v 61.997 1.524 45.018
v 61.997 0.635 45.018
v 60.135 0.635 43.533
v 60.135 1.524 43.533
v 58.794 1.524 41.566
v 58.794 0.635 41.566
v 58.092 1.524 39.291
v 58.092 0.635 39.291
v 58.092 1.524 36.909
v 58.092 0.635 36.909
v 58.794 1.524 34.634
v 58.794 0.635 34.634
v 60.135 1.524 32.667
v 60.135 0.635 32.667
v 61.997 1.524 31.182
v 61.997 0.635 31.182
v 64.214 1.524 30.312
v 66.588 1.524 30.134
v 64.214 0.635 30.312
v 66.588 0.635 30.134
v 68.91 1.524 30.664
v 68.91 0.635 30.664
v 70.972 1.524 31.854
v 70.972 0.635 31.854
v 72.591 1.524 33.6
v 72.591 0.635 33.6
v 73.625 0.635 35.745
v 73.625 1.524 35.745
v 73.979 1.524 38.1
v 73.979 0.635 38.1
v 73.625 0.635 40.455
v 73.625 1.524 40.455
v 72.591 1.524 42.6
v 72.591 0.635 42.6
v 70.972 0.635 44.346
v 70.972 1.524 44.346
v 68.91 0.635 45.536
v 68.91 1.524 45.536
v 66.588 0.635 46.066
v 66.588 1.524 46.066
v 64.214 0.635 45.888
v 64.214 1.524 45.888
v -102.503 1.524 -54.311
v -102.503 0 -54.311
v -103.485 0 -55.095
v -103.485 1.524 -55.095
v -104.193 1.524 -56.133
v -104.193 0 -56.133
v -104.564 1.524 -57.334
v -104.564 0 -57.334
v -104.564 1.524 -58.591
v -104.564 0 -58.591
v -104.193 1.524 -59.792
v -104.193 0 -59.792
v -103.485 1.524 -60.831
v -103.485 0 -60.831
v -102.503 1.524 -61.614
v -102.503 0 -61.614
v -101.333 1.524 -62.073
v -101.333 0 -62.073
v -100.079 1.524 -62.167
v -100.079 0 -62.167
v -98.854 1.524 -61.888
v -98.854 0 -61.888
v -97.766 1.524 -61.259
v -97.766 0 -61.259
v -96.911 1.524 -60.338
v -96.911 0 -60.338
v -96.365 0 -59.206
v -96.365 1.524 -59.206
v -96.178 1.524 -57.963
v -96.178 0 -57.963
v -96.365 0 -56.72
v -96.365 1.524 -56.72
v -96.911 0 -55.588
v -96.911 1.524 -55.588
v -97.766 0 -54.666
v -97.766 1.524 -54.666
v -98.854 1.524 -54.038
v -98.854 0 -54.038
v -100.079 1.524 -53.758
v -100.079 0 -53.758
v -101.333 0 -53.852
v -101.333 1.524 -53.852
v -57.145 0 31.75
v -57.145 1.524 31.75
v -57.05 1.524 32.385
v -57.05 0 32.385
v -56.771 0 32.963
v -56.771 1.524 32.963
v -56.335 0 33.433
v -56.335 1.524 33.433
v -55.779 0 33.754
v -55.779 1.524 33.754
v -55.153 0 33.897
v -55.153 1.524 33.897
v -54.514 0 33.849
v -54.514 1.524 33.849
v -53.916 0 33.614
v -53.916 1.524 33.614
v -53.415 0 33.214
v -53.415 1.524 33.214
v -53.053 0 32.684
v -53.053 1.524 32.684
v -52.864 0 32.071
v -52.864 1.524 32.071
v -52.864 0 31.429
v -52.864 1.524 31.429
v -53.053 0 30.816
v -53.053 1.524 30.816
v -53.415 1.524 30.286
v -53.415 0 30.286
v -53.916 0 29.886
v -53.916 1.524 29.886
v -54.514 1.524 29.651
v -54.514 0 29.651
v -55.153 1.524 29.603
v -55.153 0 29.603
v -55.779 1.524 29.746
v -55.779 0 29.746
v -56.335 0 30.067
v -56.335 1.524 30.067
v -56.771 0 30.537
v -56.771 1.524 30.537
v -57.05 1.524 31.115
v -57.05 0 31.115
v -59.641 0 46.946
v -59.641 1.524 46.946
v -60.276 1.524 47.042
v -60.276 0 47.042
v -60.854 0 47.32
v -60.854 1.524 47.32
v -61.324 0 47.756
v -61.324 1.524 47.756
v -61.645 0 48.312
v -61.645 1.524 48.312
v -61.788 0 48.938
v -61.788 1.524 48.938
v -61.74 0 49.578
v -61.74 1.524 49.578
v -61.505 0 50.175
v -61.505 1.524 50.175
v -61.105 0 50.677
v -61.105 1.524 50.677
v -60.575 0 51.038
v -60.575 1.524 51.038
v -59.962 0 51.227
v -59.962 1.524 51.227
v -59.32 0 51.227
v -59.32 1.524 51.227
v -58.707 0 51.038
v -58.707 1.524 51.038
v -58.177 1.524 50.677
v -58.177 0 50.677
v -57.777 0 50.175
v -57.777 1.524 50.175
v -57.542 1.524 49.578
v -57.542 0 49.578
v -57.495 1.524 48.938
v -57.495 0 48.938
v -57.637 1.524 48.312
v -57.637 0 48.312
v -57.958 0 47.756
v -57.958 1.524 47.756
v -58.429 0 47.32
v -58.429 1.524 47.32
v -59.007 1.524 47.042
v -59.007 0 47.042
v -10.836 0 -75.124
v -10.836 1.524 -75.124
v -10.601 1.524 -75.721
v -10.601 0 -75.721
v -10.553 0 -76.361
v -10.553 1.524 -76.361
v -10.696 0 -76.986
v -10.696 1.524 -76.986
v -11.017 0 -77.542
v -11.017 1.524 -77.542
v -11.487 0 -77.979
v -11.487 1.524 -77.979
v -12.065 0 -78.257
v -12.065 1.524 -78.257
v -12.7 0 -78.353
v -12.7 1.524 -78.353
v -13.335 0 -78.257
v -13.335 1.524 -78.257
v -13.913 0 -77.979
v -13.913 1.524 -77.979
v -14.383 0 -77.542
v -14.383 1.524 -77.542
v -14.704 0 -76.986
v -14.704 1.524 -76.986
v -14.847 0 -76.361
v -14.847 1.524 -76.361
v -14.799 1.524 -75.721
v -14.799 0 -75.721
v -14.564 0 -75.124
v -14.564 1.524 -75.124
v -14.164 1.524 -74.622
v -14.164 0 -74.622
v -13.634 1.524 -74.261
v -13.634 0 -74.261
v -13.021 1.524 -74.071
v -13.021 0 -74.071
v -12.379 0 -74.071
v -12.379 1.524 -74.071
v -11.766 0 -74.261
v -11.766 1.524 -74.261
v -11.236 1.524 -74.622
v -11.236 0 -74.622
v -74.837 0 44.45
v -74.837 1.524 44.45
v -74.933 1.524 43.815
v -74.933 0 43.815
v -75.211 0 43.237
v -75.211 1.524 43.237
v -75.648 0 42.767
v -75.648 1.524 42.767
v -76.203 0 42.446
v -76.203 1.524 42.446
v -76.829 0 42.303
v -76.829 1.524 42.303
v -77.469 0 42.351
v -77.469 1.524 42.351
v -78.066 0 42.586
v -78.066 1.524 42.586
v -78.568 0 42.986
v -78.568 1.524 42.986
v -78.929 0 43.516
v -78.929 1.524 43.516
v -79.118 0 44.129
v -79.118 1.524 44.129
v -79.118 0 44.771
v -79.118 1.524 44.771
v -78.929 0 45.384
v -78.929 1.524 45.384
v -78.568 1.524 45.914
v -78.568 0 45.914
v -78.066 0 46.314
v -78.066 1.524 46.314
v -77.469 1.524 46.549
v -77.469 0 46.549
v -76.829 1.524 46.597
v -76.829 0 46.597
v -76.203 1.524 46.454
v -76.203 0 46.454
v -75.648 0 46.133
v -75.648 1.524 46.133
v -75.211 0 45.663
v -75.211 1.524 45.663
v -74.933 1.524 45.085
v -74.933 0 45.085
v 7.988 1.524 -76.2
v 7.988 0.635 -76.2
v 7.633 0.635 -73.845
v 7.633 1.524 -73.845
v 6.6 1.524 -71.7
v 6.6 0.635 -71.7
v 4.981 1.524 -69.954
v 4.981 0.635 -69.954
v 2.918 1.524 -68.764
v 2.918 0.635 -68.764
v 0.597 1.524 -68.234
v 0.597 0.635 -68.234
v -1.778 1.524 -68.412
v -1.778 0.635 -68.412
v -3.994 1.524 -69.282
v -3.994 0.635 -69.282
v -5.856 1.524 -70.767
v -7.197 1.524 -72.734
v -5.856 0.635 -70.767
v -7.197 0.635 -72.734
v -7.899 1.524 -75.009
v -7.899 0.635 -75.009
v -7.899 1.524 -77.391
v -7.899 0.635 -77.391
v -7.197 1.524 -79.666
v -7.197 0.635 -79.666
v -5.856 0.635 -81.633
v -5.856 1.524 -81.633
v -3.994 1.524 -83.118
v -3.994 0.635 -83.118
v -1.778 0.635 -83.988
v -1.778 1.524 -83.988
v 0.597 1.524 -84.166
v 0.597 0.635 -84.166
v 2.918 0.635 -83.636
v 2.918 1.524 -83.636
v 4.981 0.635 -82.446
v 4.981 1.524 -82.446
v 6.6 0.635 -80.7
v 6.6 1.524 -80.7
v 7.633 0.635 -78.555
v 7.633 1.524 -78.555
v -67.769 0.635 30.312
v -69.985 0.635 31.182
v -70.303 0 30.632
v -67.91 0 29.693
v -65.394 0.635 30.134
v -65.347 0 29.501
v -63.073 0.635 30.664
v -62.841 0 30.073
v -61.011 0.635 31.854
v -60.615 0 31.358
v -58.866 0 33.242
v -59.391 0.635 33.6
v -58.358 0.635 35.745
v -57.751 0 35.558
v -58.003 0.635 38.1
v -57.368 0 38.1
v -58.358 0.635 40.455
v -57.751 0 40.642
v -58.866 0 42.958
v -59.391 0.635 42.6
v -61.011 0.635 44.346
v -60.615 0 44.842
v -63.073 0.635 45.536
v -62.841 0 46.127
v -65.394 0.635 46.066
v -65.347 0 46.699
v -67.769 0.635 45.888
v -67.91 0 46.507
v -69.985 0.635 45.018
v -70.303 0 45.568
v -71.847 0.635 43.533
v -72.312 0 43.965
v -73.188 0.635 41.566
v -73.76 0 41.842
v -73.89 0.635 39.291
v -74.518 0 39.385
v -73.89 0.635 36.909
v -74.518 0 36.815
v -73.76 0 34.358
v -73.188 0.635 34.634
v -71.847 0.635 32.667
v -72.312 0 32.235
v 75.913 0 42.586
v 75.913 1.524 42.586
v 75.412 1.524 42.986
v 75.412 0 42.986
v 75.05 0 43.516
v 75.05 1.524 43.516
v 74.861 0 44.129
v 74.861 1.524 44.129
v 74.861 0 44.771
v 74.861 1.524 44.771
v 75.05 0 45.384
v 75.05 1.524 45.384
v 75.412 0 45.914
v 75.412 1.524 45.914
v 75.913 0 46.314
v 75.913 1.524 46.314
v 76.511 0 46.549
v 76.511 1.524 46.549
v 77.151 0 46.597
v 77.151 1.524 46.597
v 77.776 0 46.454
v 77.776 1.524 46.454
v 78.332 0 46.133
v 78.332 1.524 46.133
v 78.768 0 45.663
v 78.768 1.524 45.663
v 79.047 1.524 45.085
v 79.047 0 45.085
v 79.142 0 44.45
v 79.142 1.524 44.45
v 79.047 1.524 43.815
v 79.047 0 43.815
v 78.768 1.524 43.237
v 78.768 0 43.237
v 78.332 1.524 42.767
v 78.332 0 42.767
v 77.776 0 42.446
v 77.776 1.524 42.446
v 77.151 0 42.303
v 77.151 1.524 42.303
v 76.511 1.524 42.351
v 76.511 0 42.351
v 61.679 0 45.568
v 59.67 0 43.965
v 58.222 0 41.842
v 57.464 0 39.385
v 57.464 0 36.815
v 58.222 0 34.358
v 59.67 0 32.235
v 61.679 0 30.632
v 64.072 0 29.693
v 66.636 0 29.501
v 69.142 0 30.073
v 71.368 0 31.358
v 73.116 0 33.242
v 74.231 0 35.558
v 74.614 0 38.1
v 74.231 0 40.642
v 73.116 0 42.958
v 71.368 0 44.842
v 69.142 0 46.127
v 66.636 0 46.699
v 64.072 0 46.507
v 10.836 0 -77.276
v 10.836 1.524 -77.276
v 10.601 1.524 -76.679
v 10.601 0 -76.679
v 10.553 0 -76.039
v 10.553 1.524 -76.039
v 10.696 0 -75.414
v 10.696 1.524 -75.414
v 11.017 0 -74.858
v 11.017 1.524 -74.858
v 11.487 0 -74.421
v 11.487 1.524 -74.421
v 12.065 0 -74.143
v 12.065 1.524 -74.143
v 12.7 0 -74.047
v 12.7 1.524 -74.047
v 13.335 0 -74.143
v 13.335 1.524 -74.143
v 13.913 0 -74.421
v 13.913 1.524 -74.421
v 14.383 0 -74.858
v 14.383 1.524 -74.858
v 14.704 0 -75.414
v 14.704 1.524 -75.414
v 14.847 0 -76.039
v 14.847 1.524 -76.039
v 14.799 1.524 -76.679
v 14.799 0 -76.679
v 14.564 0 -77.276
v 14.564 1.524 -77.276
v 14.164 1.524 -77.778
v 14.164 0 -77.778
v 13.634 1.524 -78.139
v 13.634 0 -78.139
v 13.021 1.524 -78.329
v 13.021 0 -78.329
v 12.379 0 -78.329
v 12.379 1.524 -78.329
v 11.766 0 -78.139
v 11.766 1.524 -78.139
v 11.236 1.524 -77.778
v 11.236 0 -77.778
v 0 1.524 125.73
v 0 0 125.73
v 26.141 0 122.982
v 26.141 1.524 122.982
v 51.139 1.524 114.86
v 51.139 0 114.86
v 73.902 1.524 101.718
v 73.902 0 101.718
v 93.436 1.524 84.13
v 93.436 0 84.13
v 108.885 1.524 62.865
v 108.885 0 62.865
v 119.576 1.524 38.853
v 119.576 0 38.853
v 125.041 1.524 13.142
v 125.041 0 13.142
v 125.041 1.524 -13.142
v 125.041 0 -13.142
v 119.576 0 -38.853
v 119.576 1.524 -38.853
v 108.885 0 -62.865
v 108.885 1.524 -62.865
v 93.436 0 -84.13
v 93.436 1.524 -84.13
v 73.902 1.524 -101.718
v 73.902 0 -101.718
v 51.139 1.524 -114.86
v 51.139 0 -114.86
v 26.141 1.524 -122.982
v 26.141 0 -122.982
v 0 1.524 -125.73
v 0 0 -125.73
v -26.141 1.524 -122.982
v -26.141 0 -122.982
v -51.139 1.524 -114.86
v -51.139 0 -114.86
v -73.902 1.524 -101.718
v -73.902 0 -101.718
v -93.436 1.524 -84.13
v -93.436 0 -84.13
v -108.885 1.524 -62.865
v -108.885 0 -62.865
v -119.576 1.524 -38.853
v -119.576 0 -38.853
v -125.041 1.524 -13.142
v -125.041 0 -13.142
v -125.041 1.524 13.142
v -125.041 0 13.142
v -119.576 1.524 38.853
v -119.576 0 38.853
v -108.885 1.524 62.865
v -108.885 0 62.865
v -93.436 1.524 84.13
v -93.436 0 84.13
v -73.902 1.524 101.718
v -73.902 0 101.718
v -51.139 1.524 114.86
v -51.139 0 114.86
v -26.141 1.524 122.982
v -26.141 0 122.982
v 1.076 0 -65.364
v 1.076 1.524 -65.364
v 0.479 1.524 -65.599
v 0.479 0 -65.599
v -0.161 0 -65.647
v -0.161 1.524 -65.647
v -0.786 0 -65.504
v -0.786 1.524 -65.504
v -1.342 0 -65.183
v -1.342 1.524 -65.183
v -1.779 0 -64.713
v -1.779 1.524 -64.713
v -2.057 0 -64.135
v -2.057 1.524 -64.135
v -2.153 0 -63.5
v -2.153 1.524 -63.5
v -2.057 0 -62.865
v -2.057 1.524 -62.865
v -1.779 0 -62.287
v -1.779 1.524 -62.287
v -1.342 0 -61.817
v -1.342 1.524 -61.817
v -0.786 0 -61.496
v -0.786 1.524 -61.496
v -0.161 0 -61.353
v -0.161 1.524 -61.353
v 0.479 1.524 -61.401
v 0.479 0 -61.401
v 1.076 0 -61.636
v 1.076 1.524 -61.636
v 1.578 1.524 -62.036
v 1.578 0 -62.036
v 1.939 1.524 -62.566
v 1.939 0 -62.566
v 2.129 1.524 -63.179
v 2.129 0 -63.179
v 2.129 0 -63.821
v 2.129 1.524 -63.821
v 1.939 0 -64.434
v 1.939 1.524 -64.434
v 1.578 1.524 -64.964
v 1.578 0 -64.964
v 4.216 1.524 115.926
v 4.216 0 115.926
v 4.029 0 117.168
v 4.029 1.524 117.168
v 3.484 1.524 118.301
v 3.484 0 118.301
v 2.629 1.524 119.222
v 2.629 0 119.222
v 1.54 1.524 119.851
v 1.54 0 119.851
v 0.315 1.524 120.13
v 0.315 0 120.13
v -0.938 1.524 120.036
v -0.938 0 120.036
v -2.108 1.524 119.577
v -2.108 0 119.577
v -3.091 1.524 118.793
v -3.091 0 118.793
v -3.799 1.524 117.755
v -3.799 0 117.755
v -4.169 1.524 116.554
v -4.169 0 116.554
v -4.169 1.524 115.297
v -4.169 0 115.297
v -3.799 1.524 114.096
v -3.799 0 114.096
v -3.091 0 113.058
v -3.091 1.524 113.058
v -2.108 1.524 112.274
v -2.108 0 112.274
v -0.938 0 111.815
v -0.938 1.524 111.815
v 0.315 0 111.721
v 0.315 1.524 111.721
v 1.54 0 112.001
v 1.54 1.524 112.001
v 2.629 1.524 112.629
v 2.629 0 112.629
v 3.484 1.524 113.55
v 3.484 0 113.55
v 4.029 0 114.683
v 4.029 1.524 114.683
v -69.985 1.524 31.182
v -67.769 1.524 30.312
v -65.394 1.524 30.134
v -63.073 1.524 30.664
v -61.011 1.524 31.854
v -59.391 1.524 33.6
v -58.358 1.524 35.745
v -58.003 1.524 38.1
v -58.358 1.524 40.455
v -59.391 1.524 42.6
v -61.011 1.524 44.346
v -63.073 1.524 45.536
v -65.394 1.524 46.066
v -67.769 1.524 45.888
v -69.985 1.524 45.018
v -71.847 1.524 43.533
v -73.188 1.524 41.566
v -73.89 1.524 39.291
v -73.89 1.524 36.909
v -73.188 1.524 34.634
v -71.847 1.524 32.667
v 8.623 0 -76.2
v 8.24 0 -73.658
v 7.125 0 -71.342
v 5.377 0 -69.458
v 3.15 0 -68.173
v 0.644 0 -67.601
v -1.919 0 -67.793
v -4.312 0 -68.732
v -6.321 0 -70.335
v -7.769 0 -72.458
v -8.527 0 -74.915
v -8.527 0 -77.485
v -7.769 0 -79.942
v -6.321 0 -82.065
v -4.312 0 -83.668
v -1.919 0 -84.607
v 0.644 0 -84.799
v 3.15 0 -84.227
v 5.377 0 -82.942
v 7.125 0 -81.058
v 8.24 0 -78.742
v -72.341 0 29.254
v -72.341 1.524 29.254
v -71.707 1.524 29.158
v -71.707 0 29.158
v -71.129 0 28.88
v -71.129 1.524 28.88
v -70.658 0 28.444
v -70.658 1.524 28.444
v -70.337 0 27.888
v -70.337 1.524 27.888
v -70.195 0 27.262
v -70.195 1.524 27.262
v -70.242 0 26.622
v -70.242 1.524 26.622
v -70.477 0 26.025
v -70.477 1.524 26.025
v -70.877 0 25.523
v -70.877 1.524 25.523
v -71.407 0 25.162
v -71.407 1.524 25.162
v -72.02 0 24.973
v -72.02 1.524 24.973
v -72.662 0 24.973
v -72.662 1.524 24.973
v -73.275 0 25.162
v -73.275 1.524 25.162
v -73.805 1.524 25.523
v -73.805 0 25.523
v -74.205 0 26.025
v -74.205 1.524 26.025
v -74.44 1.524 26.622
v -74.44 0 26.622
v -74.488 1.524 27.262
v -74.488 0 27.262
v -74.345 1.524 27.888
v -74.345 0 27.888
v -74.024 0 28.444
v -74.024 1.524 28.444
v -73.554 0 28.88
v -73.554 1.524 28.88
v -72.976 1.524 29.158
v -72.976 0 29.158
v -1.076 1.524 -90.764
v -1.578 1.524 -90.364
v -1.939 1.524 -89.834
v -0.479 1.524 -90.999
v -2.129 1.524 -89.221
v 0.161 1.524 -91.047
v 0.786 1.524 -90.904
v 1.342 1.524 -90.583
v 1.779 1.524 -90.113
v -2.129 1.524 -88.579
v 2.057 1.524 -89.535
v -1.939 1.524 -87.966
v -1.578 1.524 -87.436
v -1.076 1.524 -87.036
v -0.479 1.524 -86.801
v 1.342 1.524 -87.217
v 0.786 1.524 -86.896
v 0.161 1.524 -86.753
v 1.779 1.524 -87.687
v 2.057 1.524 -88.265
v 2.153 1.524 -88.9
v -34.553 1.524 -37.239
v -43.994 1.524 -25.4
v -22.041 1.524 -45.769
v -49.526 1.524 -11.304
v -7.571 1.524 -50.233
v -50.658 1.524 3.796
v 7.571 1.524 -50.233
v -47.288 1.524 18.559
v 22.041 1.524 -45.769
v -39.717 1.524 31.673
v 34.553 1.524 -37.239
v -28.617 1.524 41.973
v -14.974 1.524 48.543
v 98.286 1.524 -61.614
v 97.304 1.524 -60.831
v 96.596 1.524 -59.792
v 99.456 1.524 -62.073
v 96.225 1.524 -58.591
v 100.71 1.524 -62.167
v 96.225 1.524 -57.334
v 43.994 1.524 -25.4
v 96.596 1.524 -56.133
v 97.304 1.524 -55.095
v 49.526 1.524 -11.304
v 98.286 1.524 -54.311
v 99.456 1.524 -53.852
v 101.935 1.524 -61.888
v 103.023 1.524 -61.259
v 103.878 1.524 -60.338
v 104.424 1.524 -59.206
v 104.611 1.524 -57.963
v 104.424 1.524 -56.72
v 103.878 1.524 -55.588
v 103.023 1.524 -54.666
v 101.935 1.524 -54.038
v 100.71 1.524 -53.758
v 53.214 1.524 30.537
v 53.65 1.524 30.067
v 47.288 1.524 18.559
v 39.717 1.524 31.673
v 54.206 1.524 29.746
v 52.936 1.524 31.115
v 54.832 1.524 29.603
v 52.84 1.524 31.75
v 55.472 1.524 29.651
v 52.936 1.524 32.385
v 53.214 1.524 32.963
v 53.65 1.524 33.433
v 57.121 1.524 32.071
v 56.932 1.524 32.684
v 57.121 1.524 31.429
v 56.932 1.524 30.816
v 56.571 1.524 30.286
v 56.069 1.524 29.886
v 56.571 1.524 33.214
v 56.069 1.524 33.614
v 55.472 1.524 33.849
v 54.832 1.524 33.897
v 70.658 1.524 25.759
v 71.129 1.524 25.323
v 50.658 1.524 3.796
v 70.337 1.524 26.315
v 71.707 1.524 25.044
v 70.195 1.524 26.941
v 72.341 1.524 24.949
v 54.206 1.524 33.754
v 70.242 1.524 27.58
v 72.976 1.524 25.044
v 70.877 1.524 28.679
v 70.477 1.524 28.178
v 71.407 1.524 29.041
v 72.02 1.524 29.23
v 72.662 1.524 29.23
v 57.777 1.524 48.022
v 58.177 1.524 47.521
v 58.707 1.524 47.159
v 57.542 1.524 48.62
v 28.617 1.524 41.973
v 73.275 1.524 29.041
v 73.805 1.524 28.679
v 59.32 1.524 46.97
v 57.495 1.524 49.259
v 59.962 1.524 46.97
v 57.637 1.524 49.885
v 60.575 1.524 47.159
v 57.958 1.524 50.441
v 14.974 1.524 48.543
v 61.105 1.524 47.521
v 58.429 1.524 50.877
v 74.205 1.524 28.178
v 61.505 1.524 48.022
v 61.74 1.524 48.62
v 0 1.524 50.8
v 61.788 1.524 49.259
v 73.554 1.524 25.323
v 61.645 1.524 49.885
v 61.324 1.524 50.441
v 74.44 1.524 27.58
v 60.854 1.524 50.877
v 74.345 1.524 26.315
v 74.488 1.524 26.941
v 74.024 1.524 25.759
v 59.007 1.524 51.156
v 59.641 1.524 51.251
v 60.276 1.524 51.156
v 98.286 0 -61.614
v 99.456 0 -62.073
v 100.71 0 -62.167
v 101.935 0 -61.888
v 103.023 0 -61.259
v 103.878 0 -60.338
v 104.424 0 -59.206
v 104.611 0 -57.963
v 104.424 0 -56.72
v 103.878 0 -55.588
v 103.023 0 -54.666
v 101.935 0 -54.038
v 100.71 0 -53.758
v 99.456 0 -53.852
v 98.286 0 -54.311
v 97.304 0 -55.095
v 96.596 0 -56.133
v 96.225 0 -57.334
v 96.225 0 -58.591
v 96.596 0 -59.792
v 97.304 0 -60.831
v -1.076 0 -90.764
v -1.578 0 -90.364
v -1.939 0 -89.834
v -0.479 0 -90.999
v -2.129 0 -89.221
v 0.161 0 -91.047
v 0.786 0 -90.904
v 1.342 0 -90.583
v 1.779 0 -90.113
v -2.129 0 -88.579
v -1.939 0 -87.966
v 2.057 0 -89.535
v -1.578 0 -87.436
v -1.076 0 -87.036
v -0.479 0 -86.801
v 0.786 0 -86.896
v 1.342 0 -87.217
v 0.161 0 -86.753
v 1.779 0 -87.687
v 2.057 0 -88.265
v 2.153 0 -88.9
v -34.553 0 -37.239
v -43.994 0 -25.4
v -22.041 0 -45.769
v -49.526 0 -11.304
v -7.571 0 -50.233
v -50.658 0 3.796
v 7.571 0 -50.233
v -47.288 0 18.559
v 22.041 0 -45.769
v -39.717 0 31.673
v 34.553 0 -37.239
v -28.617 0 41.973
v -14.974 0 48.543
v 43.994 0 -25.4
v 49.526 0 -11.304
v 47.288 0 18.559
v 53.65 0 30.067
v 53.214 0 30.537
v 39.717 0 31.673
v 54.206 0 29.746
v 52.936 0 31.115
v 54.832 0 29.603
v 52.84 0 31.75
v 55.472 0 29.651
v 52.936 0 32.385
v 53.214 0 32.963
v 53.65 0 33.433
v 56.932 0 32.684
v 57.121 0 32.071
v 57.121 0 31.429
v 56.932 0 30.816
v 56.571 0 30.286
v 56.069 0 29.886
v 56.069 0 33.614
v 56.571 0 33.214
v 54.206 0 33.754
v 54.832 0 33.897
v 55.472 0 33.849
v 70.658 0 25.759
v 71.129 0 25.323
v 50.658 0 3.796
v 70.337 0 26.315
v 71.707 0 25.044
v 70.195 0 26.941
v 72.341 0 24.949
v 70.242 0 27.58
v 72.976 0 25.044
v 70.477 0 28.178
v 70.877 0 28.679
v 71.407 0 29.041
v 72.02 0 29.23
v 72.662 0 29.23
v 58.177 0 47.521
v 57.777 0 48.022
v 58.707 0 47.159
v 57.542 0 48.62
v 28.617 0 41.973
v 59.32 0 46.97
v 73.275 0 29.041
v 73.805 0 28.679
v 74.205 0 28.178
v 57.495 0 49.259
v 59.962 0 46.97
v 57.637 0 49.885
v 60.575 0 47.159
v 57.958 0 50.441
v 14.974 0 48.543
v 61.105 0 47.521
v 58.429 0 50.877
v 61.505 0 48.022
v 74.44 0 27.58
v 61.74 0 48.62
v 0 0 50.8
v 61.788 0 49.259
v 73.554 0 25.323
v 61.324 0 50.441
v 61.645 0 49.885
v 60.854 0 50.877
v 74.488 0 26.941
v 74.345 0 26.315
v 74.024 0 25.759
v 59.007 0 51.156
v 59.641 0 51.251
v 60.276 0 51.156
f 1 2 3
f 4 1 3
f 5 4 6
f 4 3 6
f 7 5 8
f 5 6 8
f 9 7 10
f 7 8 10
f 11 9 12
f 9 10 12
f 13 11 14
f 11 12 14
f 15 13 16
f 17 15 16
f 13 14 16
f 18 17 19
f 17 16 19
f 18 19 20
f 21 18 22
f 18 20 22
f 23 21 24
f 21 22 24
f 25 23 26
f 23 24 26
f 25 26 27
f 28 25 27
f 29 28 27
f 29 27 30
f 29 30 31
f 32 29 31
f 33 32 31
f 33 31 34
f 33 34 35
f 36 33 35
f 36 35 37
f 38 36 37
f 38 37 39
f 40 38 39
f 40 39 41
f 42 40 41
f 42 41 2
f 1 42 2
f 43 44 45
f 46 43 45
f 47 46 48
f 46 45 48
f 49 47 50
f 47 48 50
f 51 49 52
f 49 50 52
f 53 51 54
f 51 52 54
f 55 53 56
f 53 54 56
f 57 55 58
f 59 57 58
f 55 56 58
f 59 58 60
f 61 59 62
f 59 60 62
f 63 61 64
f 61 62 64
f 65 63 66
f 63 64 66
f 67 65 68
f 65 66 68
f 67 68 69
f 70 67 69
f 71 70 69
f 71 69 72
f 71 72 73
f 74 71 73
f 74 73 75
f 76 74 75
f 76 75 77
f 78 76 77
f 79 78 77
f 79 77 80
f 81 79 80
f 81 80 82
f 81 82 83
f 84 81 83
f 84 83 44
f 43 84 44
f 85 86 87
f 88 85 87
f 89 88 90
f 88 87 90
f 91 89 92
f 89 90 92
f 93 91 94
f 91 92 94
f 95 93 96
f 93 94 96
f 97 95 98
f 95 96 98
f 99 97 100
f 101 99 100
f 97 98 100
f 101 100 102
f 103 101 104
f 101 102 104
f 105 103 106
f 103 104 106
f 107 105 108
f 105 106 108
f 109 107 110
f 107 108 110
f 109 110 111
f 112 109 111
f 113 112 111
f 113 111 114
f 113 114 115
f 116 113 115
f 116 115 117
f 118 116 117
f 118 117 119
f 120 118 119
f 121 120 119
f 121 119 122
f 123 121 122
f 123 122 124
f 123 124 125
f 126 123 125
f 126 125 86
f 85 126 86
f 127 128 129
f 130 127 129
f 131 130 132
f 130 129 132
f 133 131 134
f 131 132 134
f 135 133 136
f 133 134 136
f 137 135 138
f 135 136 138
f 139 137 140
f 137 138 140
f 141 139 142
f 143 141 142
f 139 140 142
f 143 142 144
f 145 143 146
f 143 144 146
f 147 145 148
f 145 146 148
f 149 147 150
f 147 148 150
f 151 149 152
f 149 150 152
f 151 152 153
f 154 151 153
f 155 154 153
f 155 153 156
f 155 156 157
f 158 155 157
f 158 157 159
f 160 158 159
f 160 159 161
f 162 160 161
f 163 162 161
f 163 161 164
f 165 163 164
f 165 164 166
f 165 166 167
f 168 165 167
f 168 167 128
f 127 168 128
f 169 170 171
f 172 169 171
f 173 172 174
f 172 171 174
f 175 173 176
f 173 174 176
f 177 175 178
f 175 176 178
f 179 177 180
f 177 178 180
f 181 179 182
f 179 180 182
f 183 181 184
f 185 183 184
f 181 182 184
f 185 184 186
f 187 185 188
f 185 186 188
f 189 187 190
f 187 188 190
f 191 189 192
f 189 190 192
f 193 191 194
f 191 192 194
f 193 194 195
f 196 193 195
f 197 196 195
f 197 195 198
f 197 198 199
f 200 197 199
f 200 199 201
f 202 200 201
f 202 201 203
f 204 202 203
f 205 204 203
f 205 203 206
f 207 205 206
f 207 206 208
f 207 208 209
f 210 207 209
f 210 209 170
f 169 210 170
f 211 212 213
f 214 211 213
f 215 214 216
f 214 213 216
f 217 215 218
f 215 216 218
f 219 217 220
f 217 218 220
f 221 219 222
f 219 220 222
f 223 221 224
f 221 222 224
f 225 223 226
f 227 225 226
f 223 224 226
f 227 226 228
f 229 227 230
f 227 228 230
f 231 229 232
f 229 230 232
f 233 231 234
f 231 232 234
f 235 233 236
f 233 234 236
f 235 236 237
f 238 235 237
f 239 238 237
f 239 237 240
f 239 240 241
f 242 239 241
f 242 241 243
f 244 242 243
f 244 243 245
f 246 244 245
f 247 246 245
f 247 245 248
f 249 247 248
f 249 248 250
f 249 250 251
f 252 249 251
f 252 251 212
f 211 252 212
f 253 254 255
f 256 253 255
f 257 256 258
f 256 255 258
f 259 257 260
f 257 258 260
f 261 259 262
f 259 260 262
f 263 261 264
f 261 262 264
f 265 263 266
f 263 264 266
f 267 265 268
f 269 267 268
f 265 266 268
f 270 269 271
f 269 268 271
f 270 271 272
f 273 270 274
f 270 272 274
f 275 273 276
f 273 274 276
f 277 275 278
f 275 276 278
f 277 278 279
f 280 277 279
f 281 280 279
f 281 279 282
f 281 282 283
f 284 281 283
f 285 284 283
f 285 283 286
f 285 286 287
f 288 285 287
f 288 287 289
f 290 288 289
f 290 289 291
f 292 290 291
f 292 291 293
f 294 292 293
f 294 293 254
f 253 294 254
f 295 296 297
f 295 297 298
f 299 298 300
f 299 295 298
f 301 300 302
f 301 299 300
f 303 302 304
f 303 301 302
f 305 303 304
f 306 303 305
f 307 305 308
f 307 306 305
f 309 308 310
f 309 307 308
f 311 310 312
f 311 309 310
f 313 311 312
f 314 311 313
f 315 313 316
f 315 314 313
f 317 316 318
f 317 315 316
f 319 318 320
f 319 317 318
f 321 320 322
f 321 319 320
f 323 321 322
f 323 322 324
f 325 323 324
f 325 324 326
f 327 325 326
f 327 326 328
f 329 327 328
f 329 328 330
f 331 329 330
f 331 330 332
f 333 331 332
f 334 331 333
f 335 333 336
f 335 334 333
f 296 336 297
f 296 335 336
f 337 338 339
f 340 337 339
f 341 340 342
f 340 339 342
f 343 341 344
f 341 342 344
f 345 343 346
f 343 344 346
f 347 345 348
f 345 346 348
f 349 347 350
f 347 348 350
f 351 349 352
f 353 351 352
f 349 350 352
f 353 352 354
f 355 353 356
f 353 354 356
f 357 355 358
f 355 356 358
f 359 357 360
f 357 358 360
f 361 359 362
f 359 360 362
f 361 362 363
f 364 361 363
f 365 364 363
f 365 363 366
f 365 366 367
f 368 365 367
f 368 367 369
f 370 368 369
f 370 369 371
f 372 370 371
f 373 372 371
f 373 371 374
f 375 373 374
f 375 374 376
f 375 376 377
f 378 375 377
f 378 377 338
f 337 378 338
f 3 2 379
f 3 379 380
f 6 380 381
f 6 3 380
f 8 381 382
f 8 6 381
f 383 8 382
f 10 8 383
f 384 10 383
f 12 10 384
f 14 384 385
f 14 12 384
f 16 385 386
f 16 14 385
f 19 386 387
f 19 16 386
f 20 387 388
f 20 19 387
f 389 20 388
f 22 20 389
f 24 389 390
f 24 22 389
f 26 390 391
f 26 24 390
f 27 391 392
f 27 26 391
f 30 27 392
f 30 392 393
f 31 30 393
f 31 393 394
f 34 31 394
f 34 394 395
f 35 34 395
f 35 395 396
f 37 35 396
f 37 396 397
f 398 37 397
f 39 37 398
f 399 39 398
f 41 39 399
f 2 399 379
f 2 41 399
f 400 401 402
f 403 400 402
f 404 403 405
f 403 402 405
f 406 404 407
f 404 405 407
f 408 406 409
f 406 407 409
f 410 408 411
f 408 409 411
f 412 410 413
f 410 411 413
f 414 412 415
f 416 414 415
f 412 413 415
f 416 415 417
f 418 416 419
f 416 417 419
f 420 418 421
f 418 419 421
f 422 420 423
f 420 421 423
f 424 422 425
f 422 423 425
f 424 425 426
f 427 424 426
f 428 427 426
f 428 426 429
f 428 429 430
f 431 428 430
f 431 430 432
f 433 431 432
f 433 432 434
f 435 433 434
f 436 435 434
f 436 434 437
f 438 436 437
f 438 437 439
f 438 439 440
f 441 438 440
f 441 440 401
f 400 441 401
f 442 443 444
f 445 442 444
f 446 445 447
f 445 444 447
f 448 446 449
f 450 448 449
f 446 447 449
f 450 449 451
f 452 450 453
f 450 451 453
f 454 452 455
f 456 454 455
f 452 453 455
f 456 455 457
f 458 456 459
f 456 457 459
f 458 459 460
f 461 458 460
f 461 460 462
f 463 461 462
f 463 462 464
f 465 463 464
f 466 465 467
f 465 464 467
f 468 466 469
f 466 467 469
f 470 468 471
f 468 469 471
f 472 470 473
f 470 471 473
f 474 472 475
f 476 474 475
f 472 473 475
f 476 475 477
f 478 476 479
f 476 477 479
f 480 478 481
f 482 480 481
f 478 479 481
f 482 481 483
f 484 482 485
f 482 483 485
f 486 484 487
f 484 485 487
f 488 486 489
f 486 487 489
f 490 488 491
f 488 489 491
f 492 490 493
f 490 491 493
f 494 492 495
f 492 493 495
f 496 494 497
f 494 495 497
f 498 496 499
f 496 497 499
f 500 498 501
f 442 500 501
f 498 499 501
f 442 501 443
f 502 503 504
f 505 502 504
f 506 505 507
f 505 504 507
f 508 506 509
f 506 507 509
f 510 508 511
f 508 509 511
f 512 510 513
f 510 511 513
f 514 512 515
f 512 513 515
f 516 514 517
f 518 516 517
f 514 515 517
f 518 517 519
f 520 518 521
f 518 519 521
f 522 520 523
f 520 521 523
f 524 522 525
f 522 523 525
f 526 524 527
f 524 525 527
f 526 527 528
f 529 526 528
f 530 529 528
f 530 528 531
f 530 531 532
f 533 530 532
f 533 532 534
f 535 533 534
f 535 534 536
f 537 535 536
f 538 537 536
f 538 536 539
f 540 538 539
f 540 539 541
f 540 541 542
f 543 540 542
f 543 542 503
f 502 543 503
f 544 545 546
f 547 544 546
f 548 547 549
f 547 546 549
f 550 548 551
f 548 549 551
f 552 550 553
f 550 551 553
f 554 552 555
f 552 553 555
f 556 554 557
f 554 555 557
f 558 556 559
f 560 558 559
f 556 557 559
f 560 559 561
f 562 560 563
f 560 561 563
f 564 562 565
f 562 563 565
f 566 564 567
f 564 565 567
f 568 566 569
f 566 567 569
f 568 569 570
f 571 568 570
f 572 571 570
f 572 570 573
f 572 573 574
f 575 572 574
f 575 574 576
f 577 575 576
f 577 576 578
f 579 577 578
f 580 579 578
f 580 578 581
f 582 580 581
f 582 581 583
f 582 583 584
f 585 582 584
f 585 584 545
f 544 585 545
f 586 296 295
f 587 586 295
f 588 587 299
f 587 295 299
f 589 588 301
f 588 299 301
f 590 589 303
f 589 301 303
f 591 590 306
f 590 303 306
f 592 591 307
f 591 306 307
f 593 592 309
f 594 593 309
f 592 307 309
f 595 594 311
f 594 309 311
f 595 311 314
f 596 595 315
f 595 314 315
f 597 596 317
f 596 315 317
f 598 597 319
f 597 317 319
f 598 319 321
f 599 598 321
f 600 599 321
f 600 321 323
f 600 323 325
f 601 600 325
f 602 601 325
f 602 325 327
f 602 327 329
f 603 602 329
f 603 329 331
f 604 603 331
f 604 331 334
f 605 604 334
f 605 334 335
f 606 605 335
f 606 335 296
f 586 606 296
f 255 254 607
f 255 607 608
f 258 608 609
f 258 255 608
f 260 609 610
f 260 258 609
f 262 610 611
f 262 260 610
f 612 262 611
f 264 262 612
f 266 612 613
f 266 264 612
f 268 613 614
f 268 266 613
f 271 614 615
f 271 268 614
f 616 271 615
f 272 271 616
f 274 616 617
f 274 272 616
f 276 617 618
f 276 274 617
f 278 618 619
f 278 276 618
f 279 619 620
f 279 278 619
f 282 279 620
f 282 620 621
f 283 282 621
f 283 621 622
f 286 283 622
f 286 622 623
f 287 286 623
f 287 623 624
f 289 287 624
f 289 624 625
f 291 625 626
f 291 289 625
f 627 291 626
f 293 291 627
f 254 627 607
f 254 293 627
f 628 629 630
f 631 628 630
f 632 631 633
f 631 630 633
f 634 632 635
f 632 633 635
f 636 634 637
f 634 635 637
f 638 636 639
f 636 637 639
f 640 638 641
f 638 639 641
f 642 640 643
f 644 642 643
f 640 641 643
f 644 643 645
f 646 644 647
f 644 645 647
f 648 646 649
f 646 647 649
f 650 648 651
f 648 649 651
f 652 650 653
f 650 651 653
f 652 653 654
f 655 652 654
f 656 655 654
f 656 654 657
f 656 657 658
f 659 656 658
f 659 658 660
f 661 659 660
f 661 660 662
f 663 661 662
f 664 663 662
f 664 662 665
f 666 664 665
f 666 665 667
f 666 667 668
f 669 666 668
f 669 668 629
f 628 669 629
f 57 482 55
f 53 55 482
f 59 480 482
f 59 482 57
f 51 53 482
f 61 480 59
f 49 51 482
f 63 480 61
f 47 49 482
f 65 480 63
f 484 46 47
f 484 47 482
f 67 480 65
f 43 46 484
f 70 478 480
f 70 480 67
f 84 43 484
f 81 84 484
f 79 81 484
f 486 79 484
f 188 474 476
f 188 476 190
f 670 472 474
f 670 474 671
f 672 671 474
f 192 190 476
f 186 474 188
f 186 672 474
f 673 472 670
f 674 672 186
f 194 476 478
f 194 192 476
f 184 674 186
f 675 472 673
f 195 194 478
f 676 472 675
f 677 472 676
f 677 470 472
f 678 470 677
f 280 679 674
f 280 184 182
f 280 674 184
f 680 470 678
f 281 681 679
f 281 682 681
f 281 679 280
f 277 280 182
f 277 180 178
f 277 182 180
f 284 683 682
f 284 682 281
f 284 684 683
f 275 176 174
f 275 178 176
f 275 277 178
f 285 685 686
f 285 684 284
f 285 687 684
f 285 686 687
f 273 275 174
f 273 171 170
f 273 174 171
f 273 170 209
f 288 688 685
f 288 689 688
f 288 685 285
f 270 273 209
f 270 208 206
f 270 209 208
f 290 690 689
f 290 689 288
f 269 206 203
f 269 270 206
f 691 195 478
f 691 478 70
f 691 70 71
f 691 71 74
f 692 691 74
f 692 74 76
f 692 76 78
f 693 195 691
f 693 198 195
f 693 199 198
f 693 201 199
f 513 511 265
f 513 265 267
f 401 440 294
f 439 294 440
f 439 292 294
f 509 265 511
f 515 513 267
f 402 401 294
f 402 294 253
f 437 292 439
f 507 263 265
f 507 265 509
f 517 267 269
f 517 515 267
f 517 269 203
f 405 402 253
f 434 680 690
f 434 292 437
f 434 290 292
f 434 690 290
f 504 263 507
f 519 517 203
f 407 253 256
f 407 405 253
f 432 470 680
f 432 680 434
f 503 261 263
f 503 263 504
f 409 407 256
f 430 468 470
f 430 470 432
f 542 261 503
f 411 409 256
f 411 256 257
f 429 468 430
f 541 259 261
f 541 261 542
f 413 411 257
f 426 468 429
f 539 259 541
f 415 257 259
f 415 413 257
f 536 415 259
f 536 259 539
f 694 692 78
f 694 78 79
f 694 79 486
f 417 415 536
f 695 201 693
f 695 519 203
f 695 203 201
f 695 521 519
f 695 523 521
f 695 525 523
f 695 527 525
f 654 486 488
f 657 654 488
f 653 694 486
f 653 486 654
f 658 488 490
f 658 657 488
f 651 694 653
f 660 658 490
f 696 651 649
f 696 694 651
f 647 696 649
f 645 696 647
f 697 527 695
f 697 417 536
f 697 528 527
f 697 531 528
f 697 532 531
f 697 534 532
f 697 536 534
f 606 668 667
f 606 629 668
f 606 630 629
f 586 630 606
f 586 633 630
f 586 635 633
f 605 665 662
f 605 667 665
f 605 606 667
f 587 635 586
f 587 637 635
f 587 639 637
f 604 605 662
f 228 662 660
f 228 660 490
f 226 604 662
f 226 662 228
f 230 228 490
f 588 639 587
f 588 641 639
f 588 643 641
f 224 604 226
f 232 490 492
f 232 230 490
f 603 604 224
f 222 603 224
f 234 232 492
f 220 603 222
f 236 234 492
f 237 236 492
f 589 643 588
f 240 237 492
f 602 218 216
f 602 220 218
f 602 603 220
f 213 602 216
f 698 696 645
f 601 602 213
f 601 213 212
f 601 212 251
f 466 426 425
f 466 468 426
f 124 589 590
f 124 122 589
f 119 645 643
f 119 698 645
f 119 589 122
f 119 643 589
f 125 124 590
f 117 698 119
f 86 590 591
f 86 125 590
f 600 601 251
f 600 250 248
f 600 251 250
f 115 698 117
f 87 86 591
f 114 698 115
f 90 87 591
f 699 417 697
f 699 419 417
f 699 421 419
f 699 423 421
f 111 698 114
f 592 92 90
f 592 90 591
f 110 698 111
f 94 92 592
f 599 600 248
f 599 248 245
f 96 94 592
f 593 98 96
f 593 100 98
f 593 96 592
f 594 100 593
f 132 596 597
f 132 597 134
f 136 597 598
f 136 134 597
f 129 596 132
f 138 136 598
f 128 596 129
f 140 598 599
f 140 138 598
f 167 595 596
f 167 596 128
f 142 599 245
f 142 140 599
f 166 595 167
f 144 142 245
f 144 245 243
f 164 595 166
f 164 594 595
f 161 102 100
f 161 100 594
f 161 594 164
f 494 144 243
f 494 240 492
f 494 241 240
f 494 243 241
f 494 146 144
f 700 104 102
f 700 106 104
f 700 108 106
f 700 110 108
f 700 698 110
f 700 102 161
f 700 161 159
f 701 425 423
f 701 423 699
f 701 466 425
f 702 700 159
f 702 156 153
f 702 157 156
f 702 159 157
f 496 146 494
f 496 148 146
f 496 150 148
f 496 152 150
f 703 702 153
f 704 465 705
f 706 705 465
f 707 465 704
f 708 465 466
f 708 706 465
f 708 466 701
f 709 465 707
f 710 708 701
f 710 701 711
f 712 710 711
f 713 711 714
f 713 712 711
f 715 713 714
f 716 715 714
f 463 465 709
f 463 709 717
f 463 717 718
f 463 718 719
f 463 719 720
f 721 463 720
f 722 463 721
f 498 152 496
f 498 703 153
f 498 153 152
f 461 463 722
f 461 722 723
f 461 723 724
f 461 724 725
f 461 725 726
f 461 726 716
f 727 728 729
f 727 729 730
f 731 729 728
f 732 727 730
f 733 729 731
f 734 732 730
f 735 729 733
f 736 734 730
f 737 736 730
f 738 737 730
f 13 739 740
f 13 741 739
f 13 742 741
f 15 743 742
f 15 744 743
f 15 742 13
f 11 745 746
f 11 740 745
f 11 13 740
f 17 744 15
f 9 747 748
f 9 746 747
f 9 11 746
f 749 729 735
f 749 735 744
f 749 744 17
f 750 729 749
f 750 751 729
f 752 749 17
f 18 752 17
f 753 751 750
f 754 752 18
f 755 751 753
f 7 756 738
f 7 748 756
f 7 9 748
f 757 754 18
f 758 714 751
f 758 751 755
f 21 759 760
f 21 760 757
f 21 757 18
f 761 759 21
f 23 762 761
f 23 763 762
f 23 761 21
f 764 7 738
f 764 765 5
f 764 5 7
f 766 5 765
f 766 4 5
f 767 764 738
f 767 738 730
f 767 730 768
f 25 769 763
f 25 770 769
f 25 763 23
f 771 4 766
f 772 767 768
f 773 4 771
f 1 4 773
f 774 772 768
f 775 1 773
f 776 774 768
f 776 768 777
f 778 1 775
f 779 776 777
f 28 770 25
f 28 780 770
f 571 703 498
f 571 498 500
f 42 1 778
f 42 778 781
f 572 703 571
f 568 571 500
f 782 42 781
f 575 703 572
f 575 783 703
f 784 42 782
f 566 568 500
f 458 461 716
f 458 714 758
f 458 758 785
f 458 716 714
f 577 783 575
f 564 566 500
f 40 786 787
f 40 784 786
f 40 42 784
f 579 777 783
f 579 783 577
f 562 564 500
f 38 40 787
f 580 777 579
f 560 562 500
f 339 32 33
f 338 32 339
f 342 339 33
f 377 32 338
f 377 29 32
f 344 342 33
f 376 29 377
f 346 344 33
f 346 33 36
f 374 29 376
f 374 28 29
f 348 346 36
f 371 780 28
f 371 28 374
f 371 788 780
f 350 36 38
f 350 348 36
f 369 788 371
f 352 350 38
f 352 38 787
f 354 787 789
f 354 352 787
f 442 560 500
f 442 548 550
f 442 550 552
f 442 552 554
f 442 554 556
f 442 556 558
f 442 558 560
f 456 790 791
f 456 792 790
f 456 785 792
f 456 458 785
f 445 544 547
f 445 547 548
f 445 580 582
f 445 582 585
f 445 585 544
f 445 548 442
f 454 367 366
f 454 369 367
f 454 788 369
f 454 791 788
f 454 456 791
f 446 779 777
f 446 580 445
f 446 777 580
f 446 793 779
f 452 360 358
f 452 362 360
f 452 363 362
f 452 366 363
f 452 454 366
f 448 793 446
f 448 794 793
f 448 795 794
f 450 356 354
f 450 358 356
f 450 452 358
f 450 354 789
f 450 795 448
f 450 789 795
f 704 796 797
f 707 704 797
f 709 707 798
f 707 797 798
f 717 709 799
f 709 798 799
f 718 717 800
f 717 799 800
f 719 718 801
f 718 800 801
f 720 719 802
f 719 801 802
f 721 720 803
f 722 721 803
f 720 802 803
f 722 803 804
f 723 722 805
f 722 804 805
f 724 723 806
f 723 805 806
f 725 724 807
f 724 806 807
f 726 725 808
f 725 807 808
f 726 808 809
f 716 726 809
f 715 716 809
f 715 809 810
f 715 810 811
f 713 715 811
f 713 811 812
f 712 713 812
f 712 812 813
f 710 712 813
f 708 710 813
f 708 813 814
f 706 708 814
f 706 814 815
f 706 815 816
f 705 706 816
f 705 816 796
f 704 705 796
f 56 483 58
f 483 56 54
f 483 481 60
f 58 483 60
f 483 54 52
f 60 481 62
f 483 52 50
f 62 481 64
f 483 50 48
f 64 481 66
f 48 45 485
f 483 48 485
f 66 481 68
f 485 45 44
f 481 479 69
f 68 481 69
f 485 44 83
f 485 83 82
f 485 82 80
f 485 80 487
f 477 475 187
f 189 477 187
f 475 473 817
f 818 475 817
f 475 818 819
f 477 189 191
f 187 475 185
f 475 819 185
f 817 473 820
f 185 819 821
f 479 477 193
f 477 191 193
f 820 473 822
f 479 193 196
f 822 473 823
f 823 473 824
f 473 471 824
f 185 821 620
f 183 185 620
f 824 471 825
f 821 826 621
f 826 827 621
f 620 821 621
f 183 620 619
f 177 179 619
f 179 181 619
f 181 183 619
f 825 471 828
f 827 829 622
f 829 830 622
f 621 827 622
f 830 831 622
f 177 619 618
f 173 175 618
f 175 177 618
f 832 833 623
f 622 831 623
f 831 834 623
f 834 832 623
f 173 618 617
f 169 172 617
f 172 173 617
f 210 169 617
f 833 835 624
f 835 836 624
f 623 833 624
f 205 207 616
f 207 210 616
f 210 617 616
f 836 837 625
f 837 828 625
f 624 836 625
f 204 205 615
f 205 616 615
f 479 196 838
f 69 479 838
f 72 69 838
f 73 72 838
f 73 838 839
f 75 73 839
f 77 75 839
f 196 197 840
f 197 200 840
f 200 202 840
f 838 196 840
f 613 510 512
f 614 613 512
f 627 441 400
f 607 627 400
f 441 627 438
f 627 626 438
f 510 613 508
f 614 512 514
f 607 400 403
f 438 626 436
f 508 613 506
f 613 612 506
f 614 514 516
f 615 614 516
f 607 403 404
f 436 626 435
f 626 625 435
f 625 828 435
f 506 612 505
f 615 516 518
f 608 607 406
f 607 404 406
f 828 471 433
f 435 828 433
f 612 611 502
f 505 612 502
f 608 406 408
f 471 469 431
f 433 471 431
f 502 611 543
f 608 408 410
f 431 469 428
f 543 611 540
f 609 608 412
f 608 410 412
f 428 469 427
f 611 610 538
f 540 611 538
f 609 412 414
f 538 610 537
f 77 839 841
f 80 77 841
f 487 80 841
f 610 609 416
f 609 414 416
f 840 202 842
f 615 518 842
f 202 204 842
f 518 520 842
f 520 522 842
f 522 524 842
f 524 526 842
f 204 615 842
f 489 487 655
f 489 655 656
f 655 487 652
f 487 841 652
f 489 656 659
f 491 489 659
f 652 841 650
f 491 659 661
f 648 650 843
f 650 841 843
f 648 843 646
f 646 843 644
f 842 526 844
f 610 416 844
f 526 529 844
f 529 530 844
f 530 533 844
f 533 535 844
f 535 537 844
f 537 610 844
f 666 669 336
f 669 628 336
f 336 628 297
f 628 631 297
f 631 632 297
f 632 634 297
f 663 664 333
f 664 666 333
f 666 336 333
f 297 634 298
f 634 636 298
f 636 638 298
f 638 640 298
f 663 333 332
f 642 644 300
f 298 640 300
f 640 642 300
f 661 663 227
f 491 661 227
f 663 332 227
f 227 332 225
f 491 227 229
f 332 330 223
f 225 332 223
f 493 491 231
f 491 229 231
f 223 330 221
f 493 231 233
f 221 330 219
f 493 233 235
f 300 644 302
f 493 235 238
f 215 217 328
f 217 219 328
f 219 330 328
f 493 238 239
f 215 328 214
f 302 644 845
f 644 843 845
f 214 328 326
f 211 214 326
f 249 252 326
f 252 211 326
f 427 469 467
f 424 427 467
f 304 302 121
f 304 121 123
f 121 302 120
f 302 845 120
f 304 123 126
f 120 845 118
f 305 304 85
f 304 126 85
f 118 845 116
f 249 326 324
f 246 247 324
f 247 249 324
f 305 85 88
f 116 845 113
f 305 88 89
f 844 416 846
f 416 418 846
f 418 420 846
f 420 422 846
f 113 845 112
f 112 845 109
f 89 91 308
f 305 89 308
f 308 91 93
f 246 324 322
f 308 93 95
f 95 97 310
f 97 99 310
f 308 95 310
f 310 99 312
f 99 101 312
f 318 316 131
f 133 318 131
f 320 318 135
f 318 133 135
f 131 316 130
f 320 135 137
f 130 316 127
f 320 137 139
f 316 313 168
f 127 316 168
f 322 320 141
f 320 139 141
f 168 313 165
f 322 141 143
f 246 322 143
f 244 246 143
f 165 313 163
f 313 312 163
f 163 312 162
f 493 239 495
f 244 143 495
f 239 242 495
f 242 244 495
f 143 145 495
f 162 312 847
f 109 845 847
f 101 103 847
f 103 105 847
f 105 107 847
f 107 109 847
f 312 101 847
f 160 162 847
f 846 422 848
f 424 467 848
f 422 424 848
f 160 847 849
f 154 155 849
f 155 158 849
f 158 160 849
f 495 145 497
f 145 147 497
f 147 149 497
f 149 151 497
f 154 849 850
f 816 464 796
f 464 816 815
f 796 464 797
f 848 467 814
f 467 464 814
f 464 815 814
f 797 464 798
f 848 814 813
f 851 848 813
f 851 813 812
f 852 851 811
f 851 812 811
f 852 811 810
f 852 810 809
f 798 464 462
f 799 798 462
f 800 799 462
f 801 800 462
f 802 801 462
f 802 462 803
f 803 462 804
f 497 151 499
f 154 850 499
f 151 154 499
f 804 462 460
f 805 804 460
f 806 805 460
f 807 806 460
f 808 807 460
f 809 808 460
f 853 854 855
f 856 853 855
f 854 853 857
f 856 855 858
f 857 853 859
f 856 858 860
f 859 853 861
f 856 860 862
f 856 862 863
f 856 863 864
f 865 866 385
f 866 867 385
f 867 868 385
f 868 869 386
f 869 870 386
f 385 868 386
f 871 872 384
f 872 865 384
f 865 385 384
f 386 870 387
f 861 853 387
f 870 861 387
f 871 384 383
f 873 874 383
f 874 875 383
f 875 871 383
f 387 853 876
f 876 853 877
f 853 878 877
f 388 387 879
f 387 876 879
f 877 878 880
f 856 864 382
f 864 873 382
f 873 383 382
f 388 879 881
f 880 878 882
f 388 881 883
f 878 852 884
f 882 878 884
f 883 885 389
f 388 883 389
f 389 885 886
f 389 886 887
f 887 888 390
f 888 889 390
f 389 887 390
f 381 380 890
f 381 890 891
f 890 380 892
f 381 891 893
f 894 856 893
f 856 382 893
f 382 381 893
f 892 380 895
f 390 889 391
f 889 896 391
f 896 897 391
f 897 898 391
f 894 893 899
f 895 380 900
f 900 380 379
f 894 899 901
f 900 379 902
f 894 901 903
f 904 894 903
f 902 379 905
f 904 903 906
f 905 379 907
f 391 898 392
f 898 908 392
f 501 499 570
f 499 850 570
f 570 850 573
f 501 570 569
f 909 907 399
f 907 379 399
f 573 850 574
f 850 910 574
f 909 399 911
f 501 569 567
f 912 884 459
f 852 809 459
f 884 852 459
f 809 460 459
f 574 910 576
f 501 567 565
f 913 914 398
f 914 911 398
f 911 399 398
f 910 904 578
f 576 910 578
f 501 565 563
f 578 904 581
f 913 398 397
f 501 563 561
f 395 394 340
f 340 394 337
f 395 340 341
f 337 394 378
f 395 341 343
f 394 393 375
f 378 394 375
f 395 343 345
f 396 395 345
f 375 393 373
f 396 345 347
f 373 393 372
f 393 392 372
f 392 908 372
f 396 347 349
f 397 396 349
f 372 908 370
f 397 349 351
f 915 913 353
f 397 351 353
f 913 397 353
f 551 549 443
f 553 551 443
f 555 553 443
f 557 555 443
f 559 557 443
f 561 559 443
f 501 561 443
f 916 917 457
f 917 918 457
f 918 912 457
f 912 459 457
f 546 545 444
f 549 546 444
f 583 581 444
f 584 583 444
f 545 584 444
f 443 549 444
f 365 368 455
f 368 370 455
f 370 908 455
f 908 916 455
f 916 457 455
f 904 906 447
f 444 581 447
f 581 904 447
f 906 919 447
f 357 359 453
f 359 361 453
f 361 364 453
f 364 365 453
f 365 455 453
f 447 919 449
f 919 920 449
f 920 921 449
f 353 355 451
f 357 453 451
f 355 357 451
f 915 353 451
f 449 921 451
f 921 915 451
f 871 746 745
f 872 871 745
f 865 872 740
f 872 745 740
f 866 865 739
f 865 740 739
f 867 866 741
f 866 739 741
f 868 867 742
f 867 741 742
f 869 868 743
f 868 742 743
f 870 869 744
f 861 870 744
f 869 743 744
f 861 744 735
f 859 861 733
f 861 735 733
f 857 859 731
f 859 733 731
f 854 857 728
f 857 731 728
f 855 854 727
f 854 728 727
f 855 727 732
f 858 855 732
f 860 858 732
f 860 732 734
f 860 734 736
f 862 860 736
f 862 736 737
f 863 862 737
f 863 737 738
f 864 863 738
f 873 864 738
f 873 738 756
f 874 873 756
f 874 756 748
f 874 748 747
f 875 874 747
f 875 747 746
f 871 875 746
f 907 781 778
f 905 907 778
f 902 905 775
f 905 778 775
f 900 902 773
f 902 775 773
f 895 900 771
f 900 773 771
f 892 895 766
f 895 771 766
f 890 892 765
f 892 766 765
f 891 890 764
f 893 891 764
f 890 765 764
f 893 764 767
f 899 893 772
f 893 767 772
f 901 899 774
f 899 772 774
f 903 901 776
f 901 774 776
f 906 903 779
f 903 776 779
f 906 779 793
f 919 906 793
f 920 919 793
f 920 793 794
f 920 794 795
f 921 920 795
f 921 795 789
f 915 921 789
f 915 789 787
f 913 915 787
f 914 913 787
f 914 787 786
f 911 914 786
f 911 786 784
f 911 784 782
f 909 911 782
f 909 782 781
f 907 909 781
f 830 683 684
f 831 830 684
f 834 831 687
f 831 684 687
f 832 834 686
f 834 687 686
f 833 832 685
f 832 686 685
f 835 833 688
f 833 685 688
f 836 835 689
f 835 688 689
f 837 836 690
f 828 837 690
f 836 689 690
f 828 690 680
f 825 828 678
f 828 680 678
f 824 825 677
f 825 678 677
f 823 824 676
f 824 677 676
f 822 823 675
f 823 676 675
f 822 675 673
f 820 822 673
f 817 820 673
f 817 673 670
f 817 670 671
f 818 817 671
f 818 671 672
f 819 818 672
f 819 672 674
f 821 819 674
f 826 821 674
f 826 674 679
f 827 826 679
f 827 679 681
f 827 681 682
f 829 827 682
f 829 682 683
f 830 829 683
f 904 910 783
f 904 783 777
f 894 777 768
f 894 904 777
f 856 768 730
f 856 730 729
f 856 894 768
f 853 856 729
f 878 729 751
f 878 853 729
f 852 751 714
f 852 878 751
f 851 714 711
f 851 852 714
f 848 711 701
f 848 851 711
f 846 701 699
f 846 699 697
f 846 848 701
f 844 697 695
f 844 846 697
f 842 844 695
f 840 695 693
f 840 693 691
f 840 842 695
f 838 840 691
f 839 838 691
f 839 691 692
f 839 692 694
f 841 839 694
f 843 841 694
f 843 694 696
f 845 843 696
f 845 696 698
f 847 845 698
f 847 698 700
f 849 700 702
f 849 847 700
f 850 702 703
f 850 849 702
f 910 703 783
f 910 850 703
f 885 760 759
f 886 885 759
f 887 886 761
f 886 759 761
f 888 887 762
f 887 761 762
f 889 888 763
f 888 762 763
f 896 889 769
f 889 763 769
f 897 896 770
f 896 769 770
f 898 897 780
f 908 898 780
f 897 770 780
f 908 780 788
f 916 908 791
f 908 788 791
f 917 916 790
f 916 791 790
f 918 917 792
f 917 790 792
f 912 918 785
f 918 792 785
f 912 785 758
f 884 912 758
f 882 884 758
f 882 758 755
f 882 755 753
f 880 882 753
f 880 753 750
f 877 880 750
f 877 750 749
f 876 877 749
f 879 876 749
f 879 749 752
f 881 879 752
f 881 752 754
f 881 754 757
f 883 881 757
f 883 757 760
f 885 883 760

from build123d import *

# Parameters (mm, degrees)
SKETCH1_R                                = 125.73
SKETCH1_R_2                              = 50.8
EXTRUDE1_DEPTH                           = 1.524
F_5_16_CLEARANCE_HOLE1_D                 = 8.4328
CIRPATTERN1_COUNT                        = 3
F_1_4_20_WELD_NUT_CIRPATTERN_COUNT       = 3
HOLE_FOR_5_16_18_WELD_NUT_D              = 15.9766
HOLE_FOR_5_16_18_WELD_NUT_DEPTH          = 21.59
F_5_16_18_WELD_NUT_HOLE_CIRPATTERN_COUNT = 3
CHAMFER4_SIZE                            = 0.635
F_6_CLEARANCE_HOLE1_D                    = 4.3053
CIRPATTERN2_COUNT                        = 4
CIRPATTERN3_COUNT                        = 3
CIRPATTERN3_COPY_1_D                     = 4.3053
CIRPATTERN3_COPY_2_D                     = 4.3053
CIRPATTERN3_COPY_3_D                     = 4.3053
CIRPATTERN3_COPY_4_D                     = 4.3053
CIRPATTERN3_COPY_5_D                     = 4.3053
CIRPATTERN3_COPY_6_D                     = 4.3053


with BuildPart() as part:
    # Sketch1 → Extrude1 (new body)
    with BuildSketch(Plane(origin=(0, 0, 0), x_dir=(1, 0, 0), z_dir=(0, 1, 0))):
        with Locations(Location((0, 0, 0), (0, 0, 270))):  # turned: the seam where the file's is
            Circle(SKETCH1_R)
        with Locations(Location((0, 0, 0), (0, 0, 270))):  # turned: the seam where the file's is
            Circle(SKETCH1_R_2, mode=Mode.SUBTRACT)
    extrude(amount=EXTRUDE1_DEPTH)

    # 5_16 Clearance Hole1 (through all)
    with Locations(Plane(origin=(0, 1.524, 0), x_dir=(-1, 0, 0), z_dir=(0, 1, 0))):
        with Locations((0, 115.9256)):
            f_5_16_clearance_hole1 = Hole(F_5_16_CLEARANCE_HOLE1_D / 2)

    # CirPattern1: 5_16 Clearance Hole1 ×3 about axis
    cirpattern1_axis = Axis((0, 0, 0), (0, 1, 0))
    for i in range(1, CIRPATTERN1_COUNT):
        add(f_5_16_clearance_hole1.rotate(cirpattern1_axis, i * 360 / CIRPATTERN1_COUNT), mode=Mode.SUBTRACT)

    # Sketch4 → Hole For 1_4_-20 Weld Nut (revolve, cut)
    with BuildSketch(Plane(origin=(0, 1.524, -76.2), x_dir=(0, 0, 1), z_dir=(1, 0, 0))):
        Polygon((0, 0), (0, 16.54598865), (6.4008, 12.7), (6.4008, 0), align=None)
    hole_for_1_4_20_weld_nut = revolve(axis=Axis((0, 7.874, -76.2), (0, -1, 0)), mode=Mode.SUBTRACT)

    # 1_4_-20 Weld Nut CirPattern: Hole For 1_4_-20 Weld Nut ×3 about axis
    f_1_4_20_weld_nut_cirpattern_axis = Axis((0, 0, 0), (0, 1, 0))
    for i in range(1, F_1_4_20_WELD_NUT_CIRPATTERN_COUNT):
        add(hole_for_1_4_20_weld_nut.rotate(f_1_4_20_weld_nut_cirpattern_axis, i * 360 / F_1_4_20_WELD_NUT_CIRPATTERN_COUNT), mode=Mode.SUBTRACT)

    # Hole For 5_16_-18 Weld Nut
    with Locations(Plane(origin=(0, 1.524, 0), x_dir=(-1, 0, 0), z_dir=(0, 1, 0))):
        with Locations((0, -76.2)):
            hole_for_5_16_18_weld_nut = Hole(HOLE_FOR_5_16_18_WELD_NUT_D / 2, depth=HOLE_FOR_5_16_18_WELD_NUT_DEPTH)

    # 5_16_-18 Weld Nut Hole CirPattern: Hole For 5_16_-18 Weld Nut ×3 about axis
    f_5_16_18_weld_nut_hole_cirpattern_axis = Axis((0, 0, 0), (0, 1, 0))
    for i in range(1, F_5_16_18_WELD_NUT_HOLE_CIRPATTERN_COUNT):
        add(hole_for_5_16_18_weld_nut.rotate(f_5_16_18_weld_nut_hole_cirpattern_axis, i * 360 / F_5_16_18_WELD_NUT_HOLE_CIRPATTERN_COUNT), mode=Mode.SUBTRACT)

    # Chamfer4
    chamfer4_edges = [part.edges().sort_by_distance(p)[0] for p in [
        (-7.9883, 0, -76.2),
        (69.985285768, 0, 31.181929267),
        (-61.996985768, 0, 45.018070733),
    ]]
    chamfer(chamfer4_edges, length=CHAMFER4_SIZE)

    # 6 Clearance Hole1 (through all)
    with Locations(Plane.XZ):
        with Locations((-54.99261314, 31.75)):
            f_6_clearance_hole1 = Hole(F_6_CLEARANCE_HOLE1_D / 2)

    # CirPattern2: 6 Clearance Hole1 ×4 about axis
    cirpattern2_axis = Axis((-65.991135768, 0, 38.1), (0, 1, 0))
    for i in range(1, CIRPATTERN2_COUNT):
        add(f_6_clearance_hole1.rotate(cirpattern2_axis, i * 360 / CIRPATTERN2_COUNT), mode=Mode.SUBTRACT)

    # CirPattern3: 6 Clearance Hole1 ×3 about axis
    cirpattern3_axis = Axis((0, 0, 0), (0, 1, 0))
    for i in range(1, CIRPATTERN3_COUNT):
        add(f_6_clearance_hole1.rotate(cirpattern3_axis, i * 360 / CIRPATTERN3_COUNT), mode=Mode.SUBTRACT)

    # CirPattern3 copy 1 (through all)
    with Locations(Plane(origin=(27.891135768, 0, 104.091135768), x_dir=(-0.866025404, 0, 0.5), z_dir=(0, -1, 0))):
        with Locations((-54.99261314, 31.75)):
            Hole(CIRPATTERN3_COPY_1_D / 2)

    # CirPattern3 copy 2 (through all)
    with Locations(Plane(origin=(76.2, 0, -76.2), x_dir=(0.866025404, 0, 0.5), z_dir=(0, -1, 0))):
        with Locations((-54.99261314, 31.75)):
            Hole(CIRPATTERN3_COPY_2_D / 2)

    # CirPattern3 copy 3 (through all)
    with Locations(Plane(origin=(131.982271537, 0, 76.2), x_dir=(0.5, 0, 0.866025404), z_dir=(0, -1, 0))):
        with Locations((-54.99261314, 31.75)):
            Hole(CIRPATTERN3_COPY_3_D / 2)

    # CirPattern3 copy 4 (through all)
    with Locations(Plane(origin=(0, 0, -152.4), x_dir=(0.5, 0, -0.866025404), z_dir=(0, -1, 0))):
        with Locations((-54.99261314, 31.75)):
            Hole(CIRPATTERN3_COPY_4_D / 2)

    # CirPattern3 copy 5 (through all)
    with Locations(Plane(origin=(104.091135768, 0, -27.891135768), x_dir=(0.866025404, 0, -0.5), z_dir=(0, -1, 0))):
        with Locations((-54.99261314, 31.75)):
            Hole(CIRPATTERN3_COPY_5_D / 2)

    # CirPattern3 copy 6 (through all)
    with Locations(Plane(origin=(-76.2, 0, -76.2), x_dir=(-0.866025404, 0, -0.5), z_dir=(0, -1, 0))):
        with Locations((-54.99261314, 31.75)):
            Hole(CIRPATTERN3_COPY_6_D / 2)


solid = part.part
